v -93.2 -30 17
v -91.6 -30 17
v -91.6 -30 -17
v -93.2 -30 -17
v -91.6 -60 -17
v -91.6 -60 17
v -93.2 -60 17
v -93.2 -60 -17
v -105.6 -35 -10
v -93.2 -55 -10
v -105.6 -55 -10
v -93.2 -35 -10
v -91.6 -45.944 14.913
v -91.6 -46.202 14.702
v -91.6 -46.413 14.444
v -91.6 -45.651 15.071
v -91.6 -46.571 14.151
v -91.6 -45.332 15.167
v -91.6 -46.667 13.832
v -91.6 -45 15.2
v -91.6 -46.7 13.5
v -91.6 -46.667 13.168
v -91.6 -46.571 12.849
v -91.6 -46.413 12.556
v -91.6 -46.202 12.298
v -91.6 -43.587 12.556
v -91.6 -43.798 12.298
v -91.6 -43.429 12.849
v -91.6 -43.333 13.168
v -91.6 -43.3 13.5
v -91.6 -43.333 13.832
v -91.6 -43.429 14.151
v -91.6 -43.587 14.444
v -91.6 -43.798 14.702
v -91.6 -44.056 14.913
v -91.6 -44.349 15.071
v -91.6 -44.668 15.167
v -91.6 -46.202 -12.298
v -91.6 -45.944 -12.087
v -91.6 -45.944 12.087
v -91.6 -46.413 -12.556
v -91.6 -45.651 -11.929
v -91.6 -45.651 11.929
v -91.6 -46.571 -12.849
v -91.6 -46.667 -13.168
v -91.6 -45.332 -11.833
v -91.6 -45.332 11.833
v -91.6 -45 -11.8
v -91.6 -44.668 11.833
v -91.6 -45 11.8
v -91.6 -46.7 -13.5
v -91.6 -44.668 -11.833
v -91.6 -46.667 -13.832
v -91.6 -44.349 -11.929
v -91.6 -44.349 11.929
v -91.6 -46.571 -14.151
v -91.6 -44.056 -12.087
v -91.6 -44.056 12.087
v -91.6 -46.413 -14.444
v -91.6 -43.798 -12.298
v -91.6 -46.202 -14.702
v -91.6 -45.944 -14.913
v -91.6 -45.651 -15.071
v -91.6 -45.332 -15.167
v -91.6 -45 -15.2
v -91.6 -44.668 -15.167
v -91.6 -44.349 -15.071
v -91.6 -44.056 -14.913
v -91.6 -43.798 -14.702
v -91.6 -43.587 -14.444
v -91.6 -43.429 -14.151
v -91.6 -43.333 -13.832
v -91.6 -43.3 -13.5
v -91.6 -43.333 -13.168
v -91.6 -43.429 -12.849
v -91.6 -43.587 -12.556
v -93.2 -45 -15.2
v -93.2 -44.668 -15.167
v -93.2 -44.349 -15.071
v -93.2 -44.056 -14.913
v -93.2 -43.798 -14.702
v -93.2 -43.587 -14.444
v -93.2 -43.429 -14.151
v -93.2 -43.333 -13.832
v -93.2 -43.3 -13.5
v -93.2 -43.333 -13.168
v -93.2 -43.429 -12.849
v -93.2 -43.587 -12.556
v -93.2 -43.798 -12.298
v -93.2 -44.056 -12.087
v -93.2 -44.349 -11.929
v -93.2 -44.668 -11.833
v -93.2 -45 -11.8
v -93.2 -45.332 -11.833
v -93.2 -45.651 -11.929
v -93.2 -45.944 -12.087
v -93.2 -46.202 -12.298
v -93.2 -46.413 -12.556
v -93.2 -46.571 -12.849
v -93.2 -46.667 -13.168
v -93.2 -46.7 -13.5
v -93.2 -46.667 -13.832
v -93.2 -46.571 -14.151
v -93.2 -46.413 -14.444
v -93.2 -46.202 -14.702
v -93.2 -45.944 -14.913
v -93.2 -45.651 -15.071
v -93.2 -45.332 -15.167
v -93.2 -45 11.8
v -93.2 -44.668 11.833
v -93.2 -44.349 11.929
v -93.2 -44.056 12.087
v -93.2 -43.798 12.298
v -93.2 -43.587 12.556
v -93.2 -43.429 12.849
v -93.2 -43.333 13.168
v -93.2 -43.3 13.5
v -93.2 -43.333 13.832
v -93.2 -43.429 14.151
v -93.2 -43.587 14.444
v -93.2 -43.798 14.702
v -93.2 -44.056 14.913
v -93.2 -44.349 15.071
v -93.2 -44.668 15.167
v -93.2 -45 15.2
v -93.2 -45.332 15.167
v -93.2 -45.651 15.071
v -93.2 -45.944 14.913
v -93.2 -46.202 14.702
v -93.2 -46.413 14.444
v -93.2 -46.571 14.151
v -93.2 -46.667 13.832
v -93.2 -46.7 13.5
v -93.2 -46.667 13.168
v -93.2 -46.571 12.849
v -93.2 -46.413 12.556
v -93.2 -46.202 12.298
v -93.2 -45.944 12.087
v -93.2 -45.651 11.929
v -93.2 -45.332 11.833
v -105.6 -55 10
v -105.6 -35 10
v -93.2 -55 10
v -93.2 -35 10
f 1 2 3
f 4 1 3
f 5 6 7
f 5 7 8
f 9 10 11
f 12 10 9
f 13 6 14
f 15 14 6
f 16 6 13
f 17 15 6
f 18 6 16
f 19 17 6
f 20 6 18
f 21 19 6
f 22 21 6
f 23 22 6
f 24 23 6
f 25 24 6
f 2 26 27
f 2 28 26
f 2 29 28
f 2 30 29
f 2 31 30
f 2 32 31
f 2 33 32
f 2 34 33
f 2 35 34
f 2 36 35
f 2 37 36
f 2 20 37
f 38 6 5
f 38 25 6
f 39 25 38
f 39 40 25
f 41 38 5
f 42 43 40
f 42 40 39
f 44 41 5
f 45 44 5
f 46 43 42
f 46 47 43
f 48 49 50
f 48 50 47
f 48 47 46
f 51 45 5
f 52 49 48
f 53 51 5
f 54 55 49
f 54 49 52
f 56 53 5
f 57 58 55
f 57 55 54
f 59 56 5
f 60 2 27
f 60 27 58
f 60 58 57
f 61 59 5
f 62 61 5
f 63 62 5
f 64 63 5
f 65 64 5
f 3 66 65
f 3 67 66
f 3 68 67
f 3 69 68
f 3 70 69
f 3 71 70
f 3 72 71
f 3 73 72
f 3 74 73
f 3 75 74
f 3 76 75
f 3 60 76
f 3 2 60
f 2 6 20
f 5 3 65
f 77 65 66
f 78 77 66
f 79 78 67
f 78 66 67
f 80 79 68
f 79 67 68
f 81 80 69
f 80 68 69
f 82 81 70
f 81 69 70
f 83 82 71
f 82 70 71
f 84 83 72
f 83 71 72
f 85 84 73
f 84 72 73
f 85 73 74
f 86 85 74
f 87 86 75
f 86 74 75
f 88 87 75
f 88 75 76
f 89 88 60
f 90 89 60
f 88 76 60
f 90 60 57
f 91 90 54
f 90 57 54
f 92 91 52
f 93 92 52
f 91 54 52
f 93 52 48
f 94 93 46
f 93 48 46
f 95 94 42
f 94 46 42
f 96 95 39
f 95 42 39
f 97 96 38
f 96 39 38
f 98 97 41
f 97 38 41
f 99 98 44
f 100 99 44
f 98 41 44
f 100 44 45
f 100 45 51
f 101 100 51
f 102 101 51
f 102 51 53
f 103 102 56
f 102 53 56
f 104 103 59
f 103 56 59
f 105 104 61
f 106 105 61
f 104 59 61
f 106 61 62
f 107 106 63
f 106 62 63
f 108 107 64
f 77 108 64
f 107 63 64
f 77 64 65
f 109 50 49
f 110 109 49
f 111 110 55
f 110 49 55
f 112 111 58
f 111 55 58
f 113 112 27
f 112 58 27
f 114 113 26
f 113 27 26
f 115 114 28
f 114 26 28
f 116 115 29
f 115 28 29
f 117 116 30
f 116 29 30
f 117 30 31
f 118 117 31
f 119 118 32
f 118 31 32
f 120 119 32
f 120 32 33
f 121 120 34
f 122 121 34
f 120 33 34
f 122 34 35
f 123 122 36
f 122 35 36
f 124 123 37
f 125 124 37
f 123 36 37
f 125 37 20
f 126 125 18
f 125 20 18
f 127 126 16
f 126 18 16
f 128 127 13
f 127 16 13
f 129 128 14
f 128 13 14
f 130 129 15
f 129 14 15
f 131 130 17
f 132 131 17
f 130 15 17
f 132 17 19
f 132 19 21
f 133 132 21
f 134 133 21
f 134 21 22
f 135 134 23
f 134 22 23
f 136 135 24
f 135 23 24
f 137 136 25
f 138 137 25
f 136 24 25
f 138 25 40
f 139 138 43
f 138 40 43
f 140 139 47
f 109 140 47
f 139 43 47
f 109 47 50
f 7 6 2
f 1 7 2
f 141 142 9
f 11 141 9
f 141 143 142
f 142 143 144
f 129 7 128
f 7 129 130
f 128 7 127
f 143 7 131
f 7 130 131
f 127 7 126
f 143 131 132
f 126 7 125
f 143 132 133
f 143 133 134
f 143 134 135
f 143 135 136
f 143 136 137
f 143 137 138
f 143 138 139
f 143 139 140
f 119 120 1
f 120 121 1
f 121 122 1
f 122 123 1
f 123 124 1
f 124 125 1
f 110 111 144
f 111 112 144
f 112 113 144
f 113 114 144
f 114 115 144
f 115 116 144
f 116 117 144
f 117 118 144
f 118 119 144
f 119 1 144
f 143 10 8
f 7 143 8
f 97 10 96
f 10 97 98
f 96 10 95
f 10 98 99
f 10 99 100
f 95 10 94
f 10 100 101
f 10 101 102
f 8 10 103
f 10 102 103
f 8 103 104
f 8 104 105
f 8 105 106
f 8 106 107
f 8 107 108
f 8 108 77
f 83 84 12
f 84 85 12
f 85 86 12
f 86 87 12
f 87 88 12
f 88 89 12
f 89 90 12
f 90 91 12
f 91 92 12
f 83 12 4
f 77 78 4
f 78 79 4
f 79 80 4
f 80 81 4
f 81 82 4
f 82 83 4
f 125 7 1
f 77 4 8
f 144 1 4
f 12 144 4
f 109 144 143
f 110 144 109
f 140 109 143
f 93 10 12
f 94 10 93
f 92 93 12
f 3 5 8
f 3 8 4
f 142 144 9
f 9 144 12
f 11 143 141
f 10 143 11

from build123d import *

# Parameters (mm, degrees)
PLATE_START              = -91.6
PLATE_SKETCH_W           = 34
PLATE_SKETCH_H           = 30
PLATE_SKETCH_R           = 1.7
PLATE_DEPTH              = 1.6
MATEK_START              = -93.2
MATEK_M10Q_5883_SKETCH_W = 20
MATEK_M10Q_5883_SKETCH_H = 20
MATEK_M10Q_5883_DEPTH    = 12.4


with BuildPart() as part:
    # Plate Sketch → Plate (new body)
    with BuildSketch(Plane(origin=(0, 0, 0), x_dir=(0, 0, -1), z_dir=(1, 0, 0)).offset(PLATE_START)):
        with Locations((0, -45)):
            Rectangle(PLATE_SKETCH_W, PLATE_SKETCH_H)
        with Locations((13.5, -45)):
            Circle(PLATE_SKETCH_R, mode=Mode.SUBTRACT)
        with Locations((-13.5, -45)):
            Circle(PLATE_SKETCH_R, mode=Mode.SUBTRACT)
    extrude(amount=-PLATE_DEPTH)

    # Matek M10Q-5883 Sketch → Matek M10Q-5883 (add)
    with BuildSketch(Plane(origin=(0, 0, 0), x_dir=(0, 0, -1), z_dir=(1, 0, 0)).offset(MATEK_START)):
        with Locations((0, -45)):
            Rectangle(MATEK_M10Q_5883_SKETCH_W, MATEK_M10Q_5883_SKETCH_H)
    extrude(amount=-MATEK_M10Q_5883_DEPTH)


solid = part.part
